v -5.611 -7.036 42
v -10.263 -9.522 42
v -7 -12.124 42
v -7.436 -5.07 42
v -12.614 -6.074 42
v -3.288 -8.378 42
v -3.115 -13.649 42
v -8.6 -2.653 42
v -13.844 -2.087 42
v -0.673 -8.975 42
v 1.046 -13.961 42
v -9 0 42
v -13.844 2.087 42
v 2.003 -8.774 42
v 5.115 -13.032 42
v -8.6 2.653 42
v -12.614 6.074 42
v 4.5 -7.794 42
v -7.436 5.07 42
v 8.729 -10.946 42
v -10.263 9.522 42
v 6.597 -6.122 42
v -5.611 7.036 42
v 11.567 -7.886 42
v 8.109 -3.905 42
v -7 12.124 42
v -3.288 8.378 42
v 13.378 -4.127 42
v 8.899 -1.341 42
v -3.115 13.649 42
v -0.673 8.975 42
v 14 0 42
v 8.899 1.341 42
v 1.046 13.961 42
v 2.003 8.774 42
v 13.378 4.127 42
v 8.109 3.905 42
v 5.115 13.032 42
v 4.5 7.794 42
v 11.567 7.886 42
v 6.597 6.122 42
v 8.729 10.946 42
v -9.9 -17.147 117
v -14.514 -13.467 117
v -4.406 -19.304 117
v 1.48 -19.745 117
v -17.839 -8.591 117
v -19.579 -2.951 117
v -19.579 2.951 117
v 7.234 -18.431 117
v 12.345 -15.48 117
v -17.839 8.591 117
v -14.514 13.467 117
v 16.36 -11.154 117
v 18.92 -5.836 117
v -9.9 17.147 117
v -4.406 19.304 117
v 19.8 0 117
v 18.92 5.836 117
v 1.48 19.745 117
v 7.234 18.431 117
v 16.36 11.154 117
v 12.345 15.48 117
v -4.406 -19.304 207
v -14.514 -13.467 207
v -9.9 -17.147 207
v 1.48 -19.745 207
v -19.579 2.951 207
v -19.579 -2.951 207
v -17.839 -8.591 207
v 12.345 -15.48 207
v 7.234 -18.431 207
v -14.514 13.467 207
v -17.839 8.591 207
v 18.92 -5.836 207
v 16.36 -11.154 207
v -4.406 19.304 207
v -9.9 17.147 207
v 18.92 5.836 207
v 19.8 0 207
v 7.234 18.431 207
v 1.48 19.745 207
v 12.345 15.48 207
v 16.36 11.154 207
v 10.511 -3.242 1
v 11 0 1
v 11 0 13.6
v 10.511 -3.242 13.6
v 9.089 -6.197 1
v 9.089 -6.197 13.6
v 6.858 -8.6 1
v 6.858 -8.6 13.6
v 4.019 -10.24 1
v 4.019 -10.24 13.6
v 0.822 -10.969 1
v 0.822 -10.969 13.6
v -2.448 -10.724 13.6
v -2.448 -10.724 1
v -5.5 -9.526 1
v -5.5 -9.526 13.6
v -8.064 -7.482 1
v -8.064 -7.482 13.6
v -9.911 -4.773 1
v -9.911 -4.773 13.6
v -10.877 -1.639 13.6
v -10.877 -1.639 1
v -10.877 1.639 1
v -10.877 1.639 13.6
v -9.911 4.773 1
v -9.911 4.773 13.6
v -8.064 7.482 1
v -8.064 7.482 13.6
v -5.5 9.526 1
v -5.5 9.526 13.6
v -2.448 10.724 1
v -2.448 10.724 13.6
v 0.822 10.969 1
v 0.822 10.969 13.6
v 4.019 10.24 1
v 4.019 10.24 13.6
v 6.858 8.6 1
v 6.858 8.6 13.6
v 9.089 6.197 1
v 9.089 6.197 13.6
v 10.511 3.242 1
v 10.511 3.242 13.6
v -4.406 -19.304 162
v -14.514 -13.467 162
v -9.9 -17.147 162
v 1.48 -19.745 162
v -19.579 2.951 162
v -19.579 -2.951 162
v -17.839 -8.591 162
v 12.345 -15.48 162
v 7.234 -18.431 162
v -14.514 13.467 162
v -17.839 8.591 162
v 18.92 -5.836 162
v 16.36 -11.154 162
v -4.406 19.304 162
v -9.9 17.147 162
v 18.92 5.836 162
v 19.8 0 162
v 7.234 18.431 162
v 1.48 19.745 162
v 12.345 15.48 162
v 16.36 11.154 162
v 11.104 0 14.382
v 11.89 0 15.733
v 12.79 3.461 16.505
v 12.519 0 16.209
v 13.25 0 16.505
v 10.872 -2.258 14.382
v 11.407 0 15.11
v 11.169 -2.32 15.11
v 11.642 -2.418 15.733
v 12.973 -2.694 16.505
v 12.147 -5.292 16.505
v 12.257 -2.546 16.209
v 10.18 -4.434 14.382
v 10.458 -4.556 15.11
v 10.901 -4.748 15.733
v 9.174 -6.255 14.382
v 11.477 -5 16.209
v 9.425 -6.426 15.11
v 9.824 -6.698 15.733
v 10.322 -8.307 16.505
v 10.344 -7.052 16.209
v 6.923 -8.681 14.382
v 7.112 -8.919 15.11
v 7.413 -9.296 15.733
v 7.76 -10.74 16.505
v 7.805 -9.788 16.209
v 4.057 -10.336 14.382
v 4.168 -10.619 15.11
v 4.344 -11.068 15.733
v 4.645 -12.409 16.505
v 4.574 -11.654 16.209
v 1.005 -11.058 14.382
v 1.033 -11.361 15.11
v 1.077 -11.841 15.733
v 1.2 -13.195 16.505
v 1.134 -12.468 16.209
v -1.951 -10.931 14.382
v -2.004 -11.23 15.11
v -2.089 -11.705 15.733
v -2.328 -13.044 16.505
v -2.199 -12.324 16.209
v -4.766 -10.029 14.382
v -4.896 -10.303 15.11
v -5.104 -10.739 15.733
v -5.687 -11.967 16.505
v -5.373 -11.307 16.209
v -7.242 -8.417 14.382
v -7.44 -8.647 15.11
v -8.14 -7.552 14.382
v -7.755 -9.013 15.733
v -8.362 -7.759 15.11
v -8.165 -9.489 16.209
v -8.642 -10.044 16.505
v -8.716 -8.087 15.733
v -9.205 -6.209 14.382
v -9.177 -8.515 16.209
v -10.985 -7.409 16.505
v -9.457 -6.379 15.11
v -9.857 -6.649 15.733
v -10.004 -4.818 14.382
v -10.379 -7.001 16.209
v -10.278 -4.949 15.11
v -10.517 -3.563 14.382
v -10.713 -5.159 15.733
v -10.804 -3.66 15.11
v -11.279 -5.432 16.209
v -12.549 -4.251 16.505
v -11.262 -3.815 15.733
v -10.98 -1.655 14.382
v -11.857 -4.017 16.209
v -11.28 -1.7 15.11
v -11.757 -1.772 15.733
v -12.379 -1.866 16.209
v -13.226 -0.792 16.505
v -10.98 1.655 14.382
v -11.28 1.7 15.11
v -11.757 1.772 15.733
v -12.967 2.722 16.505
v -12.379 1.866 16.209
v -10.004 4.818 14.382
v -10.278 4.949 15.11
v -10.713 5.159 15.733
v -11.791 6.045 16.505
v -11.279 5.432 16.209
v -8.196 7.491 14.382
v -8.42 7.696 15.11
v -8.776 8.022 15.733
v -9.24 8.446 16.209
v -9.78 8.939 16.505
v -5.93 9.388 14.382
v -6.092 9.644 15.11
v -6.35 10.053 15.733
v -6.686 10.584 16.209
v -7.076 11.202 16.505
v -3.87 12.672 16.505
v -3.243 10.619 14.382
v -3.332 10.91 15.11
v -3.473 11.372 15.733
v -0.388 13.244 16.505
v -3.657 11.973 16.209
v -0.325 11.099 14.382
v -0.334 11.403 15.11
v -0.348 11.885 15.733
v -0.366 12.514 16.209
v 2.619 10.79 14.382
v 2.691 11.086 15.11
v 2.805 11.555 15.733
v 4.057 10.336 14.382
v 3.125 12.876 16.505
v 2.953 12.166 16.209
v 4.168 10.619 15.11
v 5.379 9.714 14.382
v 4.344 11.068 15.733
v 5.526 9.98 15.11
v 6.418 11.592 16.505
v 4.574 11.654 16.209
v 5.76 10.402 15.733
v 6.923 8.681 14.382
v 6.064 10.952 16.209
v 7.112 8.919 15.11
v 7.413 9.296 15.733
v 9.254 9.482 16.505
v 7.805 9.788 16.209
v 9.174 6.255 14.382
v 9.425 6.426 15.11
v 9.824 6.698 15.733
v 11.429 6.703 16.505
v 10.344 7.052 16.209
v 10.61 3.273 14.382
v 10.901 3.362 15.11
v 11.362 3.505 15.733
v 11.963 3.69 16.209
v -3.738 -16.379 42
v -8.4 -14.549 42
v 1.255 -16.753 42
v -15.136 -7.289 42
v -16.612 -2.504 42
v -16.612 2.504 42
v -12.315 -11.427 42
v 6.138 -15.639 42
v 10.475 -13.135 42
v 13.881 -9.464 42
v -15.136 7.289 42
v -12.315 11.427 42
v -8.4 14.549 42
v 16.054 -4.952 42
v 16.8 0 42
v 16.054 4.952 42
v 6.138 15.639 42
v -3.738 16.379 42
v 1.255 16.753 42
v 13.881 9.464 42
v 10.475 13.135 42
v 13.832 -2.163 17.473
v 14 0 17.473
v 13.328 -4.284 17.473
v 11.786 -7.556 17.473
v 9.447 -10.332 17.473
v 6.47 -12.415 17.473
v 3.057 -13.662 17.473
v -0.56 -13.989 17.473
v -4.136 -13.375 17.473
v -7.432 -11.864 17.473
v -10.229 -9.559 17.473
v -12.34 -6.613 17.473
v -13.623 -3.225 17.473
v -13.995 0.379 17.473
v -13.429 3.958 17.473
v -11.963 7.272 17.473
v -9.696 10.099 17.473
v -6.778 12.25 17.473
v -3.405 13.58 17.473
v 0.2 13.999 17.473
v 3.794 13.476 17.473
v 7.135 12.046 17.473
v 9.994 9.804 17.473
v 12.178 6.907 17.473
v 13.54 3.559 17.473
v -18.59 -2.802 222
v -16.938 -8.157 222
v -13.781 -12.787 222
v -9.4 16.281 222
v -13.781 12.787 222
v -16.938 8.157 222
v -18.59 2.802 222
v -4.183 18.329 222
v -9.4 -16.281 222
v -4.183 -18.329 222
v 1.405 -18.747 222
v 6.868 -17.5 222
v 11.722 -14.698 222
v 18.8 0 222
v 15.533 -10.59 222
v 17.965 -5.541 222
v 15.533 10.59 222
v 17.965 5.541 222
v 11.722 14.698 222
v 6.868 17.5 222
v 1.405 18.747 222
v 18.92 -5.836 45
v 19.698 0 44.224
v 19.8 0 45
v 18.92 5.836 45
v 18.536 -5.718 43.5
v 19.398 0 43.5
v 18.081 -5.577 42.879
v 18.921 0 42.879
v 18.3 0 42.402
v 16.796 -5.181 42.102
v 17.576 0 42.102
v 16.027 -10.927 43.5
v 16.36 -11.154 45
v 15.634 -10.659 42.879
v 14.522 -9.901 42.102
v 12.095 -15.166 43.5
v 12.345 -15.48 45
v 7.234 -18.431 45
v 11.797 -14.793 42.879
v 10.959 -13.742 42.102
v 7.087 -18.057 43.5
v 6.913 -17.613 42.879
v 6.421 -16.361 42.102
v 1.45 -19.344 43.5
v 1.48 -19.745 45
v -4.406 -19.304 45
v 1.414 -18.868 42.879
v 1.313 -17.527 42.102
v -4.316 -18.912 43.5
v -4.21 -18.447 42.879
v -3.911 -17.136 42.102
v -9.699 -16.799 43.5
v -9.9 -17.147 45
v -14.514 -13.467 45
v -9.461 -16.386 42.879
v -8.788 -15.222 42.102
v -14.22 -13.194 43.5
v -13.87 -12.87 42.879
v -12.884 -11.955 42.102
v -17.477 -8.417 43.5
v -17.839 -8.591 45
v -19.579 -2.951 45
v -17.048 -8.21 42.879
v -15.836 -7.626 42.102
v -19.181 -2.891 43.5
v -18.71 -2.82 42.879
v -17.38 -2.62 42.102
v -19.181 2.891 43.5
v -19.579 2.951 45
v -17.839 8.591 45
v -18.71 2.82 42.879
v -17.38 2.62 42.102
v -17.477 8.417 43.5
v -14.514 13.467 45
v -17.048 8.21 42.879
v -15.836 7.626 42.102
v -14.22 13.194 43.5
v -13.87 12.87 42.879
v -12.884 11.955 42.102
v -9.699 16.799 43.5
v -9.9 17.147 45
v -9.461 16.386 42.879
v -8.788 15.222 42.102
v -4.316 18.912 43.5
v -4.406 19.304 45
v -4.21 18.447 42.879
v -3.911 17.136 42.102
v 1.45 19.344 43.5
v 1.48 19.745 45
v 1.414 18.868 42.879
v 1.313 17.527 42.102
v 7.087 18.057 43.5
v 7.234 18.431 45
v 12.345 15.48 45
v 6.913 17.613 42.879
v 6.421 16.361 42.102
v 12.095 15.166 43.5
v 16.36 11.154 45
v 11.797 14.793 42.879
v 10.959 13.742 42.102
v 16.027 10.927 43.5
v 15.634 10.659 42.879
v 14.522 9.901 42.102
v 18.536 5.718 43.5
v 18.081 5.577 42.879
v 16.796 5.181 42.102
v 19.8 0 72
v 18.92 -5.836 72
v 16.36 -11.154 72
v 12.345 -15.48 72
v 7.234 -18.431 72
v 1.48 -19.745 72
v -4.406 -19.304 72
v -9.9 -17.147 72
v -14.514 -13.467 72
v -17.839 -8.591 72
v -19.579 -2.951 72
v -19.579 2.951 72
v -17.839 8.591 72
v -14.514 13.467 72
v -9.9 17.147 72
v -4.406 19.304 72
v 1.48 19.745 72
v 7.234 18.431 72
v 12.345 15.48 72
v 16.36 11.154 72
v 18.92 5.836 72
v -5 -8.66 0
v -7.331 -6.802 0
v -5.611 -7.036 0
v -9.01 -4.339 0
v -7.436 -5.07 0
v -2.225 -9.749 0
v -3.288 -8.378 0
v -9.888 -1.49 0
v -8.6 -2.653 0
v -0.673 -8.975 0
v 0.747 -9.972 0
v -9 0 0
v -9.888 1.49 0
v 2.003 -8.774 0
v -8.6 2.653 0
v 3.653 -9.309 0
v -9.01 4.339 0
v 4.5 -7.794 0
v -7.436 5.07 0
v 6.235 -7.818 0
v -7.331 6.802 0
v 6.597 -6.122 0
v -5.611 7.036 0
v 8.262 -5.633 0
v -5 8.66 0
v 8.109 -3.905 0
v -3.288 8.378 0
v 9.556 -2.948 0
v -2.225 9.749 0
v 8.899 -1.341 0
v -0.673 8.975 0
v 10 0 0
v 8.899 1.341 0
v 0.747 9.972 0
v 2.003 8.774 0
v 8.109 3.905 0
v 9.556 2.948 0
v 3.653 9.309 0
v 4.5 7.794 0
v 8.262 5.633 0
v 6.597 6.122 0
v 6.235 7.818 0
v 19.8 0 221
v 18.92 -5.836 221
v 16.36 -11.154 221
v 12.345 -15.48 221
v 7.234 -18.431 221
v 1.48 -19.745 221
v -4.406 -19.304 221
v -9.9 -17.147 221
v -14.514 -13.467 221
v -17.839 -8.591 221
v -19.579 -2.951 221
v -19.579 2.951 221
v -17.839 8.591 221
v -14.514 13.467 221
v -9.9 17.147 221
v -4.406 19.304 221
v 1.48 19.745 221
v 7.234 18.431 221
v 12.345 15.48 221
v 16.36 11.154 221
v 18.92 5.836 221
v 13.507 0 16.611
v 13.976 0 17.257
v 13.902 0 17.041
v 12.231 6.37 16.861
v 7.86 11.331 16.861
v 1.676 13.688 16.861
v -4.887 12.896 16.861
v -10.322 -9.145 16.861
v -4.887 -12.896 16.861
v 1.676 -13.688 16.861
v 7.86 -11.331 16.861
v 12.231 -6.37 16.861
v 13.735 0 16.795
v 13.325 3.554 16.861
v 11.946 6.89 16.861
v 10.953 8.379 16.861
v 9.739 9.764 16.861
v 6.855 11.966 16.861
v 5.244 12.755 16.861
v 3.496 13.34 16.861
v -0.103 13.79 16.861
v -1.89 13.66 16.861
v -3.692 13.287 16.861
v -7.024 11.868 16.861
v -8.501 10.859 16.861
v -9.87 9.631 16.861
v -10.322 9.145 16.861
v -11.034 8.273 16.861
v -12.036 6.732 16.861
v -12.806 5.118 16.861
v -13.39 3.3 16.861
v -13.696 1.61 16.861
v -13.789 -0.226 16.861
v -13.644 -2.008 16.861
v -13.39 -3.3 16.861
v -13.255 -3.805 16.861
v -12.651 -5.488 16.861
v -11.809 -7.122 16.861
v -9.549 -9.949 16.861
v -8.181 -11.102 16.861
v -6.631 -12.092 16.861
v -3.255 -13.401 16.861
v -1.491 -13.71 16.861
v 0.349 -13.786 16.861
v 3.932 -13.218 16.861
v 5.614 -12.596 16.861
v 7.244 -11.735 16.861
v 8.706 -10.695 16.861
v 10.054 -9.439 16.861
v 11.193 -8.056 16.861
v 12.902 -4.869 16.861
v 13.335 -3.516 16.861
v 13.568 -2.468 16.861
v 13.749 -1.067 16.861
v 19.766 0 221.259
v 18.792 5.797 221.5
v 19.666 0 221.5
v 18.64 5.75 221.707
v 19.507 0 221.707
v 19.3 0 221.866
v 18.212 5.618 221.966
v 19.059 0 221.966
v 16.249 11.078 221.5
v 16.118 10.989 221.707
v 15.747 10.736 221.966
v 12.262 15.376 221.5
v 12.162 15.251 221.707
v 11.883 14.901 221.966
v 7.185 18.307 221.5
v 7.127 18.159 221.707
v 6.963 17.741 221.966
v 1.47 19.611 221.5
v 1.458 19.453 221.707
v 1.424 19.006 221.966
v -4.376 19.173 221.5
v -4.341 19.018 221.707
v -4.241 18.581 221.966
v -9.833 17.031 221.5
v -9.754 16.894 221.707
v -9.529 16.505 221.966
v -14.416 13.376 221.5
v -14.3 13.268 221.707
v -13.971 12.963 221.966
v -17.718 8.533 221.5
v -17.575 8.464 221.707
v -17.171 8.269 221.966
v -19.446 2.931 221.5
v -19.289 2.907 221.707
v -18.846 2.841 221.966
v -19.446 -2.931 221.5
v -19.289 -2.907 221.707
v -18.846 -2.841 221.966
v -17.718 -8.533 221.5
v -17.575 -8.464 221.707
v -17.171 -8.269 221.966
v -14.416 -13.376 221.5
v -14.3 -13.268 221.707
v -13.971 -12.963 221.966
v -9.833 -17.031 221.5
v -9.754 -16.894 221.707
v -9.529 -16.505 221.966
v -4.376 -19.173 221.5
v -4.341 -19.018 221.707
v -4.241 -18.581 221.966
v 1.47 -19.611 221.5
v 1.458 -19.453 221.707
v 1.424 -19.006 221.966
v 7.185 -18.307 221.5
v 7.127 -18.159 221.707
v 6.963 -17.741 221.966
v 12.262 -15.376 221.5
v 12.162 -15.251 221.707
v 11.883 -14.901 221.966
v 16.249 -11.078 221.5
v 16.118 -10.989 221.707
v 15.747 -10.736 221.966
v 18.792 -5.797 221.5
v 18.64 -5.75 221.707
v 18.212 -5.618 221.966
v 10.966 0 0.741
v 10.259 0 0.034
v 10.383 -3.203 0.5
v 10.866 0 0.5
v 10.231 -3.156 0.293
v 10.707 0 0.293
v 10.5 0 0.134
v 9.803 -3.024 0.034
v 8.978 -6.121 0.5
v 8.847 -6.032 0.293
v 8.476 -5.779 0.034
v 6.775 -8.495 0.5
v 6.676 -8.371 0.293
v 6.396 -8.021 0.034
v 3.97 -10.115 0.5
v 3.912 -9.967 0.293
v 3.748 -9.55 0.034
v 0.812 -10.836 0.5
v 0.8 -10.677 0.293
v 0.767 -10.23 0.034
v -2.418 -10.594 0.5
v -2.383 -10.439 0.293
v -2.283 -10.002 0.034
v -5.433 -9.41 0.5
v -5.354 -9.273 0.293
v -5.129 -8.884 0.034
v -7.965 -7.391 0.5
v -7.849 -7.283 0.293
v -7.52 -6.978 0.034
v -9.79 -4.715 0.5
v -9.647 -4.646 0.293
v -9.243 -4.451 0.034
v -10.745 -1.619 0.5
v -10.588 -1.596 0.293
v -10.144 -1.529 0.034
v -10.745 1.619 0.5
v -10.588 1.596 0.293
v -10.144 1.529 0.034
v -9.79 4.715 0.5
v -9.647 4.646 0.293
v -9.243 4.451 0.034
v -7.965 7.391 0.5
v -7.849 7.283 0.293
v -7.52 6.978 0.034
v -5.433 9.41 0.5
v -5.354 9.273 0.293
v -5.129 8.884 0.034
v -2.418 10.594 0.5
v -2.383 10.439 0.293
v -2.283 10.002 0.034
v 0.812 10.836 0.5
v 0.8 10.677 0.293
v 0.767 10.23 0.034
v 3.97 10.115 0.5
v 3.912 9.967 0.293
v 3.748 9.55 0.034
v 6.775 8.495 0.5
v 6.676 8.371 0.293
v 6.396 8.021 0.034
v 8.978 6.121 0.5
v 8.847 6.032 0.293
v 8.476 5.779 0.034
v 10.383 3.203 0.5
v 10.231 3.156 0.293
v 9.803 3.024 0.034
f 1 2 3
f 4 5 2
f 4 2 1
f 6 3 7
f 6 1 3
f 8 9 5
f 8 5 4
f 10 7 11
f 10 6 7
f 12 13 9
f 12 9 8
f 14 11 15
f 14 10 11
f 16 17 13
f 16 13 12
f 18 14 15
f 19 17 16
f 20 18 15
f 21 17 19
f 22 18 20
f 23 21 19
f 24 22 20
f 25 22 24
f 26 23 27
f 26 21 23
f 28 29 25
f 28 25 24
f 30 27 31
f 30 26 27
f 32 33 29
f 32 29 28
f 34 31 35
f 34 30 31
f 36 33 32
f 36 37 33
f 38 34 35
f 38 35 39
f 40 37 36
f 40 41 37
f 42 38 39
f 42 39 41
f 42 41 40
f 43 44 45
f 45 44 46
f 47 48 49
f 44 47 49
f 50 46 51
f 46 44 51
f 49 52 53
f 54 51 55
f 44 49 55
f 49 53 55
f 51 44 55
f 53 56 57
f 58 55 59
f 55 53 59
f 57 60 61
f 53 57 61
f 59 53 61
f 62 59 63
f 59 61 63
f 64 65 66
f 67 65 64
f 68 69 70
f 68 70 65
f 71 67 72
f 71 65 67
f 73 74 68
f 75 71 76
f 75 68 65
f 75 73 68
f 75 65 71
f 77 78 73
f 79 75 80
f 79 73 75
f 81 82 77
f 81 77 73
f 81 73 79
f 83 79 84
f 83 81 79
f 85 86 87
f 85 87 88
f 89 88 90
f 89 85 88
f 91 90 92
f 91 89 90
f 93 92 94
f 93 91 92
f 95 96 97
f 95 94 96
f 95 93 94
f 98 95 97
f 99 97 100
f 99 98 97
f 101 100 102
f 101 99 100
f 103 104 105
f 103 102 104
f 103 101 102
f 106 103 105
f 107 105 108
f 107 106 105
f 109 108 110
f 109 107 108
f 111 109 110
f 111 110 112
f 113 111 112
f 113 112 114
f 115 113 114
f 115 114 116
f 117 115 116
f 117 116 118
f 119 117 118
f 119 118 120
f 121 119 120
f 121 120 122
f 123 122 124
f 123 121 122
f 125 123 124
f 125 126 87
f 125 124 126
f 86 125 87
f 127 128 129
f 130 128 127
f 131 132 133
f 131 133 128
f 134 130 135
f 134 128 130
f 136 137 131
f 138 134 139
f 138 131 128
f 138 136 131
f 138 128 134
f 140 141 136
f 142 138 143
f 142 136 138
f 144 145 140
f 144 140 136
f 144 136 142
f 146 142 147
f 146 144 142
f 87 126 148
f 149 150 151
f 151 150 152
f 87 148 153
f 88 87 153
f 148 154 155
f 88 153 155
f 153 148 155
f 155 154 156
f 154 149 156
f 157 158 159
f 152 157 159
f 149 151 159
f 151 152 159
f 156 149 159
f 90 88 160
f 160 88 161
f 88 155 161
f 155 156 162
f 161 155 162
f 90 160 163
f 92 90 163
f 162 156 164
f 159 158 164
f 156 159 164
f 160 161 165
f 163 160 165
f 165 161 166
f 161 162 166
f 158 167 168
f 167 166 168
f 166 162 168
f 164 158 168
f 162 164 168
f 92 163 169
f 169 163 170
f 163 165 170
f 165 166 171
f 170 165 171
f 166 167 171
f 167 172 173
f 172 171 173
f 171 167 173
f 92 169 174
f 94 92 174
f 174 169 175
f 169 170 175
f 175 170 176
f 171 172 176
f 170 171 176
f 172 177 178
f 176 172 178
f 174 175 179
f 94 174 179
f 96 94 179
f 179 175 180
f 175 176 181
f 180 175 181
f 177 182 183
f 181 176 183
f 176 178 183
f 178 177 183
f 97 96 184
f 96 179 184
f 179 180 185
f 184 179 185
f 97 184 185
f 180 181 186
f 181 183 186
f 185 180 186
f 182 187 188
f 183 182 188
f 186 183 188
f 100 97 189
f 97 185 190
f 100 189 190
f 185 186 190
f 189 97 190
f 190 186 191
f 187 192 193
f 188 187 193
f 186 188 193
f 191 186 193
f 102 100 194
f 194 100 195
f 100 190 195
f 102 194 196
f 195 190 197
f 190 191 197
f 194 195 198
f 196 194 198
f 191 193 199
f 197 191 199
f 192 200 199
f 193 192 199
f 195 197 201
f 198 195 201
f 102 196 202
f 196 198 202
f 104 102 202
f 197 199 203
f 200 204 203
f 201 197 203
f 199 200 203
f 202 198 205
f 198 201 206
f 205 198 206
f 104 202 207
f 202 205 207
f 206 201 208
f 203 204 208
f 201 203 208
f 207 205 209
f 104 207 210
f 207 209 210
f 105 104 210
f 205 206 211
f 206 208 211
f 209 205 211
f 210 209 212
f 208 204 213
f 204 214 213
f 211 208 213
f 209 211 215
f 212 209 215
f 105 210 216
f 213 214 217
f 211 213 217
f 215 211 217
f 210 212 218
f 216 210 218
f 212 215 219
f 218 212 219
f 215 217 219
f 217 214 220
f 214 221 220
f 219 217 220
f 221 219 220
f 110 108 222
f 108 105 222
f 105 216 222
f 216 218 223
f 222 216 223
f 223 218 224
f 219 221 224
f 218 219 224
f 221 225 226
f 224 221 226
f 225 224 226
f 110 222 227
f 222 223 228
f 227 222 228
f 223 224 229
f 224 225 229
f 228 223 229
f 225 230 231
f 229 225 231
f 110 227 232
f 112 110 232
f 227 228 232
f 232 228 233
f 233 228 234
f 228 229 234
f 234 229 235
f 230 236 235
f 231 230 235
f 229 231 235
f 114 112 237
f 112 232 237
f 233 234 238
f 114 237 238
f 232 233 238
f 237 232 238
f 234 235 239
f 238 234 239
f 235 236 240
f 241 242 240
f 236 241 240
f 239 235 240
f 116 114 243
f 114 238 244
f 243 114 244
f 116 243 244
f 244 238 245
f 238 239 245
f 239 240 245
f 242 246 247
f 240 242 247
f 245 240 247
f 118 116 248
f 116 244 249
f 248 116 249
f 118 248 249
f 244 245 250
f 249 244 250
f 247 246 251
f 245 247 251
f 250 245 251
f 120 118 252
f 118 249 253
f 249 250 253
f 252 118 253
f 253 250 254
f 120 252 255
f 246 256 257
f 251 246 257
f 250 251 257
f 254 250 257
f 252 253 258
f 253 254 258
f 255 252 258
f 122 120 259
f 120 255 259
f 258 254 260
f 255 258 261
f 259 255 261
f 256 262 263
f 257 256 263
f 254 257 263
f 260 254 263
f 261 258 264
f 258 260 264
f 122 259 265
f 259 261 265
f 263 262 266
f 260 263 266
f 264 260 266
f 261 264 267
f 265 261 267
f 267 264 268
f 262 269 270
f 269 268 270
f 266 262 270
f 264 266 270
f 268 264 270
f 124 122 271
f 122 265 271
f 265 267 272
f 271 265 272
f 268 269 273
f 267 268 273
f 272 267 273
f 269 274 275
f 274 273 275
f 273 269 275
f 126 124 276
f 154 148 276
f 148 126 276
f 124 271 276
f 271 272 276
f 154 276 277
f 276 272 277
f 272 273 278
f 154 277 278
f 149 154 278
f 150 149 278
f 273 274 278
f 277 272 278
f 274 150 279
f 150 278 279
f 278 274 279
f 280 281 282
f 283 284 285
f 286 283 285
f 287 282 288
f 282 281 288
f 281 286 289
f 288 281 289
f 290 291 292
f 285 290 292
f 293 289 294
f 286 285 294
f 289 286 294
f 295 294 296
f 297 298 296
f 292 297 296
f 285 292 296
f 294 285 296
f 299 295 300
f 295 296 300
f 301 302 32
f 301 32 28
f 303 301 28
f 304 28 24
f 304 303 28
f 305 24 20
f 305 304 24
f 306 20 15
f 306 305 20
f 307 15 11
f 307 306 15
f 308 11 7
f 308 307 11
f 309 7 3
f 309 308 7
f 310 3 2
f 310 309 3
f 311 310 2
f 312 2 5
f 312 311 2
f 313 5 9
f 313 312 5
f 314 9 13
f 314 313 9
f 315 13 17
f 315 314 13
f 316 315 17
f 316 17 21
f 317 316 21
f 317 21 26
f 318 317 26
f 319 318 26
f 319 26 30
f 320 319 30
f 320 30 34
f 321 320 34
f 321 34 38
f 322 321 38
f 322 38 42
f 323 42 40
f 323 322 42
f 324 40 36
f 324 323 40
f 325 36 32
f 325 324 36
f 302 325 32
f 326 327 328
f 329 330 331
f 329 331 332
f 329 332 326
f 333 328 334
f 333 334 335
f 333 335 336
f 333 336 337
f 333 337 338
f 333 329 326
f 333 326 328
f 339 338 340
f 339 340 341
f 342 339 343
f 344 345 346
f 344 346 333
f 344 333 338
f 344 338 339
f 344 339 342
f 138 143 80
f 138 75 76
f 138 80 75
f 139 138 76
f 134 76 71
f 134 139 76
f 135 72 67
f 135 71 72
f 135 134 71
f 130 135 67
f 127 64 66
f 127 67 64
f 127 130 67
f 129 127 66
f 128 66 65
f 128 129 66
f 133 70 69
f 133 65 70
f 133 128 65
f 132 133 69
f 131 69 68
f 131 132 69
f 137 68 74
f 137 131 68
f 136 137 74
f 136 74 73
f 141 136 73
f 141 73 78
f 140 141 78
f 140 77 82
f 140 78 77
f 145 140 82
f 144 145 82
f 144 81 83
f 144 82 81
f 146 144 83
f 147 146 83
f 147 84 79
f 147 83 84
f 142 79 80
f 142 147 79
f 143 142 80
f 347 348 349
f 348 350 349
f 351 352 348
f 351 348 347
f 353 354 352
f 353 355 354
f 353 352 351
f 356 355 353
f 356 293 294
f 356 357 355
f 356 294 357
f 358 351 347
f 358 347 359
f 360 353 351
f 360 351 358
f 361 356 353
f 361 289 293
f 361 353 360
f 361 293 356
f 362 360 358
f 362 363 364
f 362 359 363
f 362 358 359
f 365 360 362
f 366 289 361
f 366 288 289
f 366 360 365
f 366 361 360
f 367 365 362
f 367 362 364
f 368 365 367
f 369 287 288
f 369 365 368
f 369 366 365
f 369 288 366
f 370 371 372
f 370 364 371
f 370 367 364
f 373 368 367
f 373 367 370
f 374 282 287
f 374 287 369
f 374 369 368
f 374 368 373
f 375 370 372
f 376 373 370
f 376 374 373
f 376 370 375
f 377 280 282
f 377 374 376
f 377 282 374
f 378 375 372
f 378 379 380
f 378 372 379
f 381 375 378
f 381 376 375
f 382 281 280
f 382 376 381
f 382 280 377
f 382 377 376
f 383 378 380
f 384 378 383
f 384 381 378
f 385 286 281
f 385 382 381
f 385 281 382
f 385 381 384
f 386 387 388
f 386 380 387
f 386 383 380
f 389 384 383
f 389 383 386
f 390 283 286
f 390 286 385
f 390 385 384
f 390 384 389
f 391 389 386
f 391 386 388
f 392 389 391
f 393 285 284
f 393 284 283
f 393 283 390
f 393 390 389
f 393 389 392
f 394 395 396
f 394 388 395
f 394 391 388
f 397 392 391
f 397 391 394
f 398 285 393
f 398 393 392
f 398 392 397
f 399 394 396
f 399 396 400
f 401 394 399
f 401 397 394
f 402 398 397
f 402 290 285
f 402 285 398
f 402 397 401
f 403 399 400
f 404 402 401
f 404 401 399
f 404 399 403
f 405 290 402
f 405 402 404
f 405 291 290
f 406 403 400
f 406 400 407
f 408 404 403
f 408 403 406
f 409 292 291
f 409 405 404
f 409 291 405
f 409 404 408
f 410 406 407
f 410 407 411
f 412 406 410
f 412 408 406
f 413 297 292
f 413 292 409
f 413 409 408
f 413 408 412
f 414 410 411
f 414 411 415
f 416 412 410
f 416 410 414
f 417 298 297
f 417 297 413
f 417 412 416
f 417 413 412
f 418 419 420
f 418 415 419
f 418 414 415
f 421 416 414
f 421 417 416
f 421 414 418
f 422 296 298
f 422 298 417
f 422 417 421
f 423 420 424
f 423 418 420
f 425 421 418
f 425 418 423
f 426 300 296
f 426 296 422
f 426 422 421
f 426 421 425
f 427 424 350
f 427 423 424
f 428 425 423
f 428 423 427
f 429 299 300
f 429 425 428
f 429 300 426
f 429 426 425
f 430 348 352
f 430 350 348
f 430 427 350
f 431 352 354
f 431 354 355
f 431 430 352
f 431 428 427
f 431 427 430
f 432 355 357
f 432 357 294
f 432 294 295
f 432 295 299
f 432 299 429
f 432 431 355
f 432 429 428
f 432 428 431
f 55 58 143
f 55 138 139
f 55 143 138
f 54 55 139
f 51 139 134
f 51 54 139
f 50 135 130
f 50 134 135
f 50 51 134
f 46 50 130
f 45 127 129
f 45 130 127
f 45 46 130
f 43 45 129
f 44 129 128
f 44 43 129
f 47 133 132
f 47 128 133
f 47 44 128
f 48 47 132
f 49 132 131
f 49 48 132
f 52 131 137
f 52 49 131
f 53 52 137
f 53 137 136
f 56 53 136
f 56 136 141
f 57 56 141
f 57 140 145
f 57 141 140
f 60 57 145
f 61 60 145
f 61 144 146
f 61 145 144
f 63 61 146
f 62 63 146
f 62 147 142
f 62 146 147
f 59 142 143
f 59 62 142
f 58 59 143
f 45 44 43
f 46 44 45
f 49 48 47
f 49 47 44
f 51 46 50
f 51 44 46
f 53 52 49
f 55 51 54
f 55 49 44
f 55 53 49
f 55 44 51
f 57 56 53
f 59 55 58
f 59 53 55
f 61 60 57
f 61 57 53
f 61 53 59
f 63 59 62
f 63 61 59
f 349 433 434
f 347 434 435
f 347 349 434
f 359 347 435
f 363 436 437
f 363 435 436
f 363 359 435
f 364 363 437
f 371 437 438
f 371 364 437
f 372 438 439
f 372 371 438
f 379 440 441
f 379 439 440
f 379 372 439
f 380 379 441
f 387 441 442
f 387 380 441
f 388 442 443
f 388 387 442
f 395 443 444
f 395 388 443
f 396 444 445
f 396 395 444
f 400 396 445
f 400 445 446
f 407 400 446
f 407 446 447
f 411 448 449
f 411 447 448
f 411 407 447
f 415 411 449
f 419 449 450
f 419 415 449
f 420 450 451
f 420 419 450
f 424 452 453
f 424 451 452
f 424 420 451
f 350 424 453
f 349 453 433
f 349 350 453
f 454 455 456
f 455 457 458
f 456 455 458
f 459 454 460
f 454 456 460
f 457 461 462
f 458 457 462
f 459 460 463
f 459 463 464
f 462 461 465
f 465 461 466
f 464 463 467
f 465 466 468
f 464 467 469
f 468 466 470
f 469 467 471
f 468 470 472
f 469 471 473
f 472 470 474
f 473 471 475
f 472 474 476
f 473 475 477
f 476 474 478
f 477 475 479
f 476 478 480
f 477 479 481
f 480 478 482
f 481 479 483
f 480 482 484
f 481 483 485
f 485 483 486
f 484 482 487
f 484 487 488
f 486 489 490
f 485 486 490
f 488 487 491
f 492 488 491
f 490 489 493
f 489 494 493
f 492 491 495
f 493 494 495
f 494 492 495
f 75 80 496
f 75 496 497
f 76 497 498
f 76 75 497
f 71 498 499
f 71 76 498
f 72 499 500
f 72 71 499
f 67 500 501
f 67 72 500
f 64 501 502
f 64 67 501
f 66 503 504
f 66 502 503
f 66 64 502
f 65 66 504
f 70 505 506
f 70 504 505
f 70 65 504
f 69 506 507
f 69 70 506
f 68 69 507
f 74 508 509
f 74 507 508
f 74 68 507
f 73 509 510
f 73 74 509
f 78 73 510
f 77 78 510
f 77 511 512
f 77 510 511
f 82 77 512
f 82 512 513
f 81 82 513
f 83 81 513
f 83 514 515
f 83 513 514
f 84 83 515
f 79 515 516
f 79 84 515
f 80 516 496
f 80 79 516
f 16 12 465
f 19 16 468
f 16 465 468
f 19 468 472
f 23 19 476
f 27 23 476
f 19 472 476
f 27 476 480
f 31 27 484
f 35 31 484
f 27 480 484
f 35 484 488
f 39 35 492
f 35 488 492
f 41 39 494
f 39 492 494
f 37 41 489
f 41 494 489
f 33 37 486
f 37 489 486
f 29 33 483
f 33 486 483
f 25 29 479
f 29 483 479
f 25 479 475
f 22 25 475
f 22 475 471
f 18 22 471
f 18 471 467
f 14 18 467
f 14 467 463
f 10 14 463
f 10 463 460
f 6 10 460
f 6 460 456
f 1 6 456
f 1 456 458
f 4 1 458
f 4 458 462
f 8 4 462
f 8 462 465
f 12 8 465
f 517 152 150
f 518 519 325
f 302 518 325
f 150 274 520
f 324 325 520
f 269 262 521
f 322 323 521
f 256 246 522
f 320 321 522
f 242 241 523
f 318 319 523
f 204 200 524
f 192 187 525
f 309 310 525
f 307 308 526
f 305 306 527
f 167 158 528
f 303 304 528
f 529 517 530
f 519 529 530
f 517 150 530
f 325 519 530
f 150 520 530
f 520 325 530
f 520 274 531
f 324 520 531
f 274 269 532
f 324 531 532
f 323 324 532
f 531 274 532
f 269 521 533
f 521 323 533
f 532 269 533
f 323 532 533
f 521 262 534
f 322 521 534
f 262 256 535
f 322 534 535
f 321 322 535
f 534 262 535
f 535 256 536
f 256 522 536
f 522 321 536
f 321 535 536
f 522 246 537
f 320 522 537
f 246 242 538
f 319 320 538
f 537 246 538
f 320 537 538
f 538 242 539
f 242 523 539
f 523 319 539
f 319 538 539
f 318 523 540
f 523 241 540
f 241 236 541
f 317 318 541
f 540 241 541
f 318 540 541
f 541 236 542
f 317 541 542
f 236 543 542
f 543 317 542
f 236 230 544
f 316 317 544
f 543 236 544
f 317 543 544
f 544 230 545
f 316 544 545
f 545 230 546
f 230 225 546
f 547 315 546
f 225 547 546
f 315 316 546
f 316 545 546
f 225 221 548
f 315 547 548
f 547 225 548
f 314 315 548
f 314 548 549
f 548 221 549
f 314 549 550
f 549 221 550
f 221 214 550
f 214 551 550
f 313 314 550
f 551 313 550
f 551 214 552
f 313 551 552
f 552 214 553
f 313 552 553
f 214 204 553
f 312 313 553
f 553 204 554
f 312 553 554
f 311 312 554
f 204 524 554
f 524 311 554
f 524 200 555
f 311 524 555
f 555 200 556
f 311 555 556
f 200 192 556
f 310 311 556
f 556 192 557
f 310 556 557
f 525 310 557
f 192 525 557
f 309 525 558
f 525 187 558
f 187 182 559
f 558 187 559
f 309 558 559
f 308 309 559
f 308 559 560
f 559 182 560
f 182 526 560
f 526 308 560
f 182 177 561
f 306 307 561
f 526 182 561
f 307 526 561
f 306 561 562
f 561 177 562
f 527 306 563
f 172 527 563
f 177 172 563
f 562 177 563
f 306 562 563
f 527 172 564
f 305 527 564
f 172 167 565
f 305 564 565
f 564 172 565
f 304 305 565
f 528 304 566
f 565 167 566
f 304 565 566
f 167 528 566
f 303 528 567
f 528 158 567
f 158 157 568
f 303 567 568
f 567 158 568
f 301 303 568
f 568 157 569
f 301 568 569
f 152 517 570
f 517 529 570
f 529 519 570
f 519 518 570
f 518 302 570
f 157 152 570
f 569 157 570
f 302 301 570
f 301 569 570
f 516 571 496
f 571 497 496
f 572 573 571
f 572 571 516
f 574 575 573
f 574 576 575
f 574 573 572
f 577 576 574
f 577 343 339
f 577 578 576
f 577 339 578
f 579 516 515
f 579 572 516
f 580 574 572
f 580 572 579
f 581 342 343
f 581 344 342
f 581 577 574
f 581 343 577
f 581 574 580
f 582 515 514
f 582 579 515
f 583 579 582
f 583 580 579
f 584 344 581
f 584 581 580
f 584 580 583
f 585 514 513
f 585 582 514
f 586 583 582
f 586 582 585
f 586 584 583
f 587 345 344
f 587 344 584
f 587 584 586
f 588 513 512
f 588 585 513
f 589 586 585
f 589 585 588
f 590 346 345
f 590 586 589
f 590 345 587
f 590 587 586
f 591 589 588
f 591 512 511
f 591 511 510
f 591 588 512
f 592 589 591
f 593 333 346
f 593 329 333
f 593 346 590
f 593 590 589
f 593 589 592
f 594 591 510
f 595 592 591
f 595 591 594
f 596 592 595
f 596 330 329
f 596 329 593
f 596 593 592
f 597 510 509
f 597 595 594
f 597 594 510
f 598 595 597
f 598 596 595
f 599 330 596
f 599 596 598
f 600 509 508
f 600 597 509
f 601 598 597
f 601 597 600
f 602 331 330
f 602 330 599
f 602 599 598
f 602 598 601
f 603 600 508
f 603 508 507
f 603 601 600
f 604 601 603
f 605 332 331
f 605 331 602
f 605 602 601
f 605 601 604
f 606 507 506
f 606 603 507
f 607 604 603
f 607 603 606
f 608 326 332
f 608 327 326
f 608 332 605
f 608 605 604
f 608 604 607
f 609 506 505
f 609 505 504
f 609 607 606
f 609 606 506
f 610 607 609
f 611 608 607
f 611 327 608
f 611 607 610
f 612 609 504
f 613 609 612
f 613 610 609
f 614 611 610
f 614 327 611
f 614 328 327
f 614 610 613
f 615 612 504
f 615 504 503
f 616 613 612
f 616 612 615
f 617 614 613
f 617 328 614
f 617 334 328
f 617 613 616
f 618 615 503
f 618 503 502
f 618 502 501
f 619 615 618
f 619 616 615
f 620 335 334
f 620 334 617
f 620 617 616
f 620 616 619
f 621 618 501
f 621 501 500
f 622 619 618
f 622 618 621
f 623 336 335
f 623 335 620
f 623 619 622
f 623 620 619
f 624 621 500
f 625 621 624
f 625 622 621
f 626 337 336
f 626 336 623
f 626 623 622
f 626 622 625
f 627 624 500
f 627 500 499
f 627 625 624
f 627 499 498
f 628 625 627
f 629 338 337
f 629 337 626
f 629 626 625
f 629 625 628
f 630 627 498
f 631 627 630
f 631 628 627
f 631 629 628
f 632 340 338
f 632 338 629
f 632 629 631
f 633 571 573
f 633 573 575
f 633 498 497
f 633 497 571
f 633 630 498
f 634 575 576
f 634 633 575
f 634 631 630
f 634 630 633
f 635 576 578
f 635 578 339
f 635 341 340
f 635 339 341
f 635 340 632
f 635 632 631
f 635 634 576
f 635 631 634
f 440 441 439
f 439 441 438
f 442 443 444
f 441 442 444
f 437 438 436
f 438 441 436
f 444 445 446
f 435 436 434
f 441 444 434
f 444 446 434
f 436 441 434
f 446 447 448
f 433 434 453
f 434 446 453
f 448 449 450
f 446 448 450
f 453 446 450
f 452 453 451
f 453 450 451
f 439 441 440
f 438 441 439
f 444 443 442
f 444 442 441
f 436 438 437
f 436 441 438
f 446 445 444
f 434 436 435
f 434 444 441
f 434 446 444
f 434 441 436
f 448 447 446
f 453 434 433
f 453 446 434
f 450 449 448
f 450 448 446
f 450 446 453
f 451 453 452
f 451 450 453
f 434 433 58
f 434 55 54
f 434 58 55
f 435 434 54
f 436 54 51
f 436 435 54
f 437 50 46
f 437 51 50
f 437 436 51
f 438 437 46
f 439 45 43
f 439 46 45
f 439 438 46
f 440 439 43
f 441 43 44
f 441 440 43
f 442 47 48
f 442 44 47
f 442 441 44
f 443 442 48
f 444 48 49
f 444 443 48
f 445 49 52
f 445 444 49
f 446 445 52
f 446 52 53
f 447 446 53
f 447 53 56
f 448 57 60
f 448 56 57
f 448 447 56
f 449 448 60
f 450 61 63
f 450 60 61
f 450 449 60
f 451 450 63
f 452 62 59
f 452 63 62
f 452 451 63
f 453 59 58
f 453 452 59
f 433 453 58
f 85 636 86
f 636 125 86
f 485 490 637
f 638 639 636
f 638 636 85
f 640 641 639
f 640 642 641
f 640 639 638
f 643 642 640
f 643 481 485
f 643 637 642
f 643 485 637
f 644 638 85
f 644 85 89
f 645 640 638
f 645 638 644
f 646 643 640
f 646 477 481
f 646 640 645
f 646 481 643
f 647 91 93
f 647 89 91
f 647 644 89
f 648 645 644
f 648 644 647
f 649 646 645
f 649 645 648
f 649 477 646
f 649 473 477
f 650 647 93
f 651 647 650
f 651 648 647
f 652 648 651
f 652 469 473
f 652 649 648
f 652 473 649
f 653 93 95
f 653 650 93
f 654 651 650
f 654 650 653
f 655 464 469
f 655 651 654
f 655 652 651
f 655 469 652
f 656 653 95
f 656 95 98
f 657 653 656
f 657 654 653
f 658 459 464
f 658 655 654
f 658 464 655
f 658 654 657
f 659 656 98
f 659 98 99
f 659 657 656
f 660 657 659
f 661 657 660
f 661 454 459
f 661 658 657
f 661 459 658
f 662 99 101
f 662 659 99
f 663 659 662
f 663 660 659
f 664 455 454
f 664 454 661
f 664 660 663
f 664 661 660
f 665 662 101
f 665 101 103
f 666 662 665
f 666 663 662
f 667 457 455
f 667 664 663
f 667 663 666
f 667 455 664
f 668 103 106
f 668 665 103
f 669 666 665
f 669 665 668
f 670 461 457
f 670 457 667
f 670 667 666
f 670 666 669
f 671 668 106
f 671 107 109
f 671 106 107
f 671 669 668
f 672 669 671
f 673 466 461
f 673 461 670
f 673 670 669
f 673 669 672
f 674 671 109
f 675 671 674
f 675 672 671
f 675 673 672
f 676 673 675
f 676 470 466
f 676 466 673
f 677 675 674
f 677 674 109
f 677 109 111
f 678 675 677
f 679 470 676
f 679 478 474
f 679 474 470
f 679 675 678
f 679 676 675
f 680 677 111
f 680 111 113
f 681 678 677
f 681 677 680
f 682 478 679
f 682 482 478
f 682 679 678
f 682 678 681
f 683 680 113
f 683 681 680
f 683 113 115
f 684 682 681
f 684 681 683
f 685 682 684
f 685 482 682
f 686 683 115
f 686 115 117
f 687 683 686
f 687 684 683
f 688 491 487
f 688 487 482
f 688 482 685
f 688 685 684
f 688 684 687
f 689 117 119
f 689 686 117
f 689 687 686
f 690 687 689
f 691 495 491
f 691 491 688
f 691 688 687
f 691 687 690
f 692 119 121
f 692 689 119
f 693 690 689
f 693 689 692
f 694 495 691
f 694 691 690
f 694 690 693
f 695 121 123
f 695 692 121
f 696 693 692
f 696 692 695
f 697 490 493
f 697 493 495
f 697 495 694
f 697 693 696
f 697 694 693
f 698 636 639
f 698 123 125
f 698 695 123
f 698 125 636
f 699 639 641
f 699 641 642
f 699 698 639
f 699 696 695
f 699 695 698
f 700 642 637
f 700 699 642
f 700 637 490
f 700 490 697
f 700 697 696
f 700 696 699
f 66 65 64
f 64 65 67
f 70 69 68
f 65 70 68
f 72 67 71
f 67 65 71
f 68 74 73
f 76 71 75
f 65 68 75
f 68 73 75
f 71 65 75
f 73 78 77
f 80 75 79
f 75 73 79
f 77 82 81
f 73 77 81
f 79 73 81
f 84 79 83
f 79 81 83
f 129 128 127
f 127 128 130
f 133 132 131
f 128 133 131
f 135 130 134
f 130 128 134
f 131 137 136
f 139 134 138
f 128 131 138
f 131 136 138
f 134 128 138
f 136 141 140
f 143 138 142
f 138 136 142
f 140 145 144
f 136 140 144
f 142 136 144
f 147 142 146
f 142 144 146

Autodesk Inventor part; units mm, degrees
ref_plane "YZ Plane" through (0, 0, 0) normal (1, 0, 0) x (0, 1, 0)
ref_plane "XZ Plane" through (0, 0, 0) normal (0, 1, 0) x (-1, 0, 0)
ref_plane "XY Plane" through (0, 0, 0) normal (0, 0, 1) x (1, 0, 0)
sketch "Sketch1" plane through (0, 0, 0) normal (0, 0, 1) x (1, 0, 0)
  circle A0 centre (0, 0) radius 11
  dimension "d0" = 22
extrude "Extrusion1" add sketch "Sketch1" along normal blind 16.6
sketch "Sketch2" plane through (0, 0, 16.6) normal (0, 0, 1) x (1, 0, 0)
  circle A0 centre (0, 0) radius 14
  dimension "d3" = 28
extrude "Extrusion2" add sketch "Sketch2" along normal blind 25.4
sketch "Sketch3" plane through (0, 0, 0) normal (0, 0, -1) x (-1, 0, 0)
  circle A0 centre (0, 0) radius 9
  dimension "d6" = 18
extrude "Extrusion3" cut sketch "Sketch3" against normal through all
fillet "Fillet1" radius 1 1 edges at (-11, 0, 0)
fillet "Fillet2" radius 3 1 edges at (-11, 0, 16.6)
sketch "Sketch4" plane through (0, 0, 42) normal (0, 0, 1) x (1, 0, 0)
  circle A0 centre (0, 0) radius 19.8
  dimension "d11" = 39.6
extrude "Extrusion4" add sketch "Sketch4" along normal blind 30 separate body
sketch "Sketch5" plane through (0, 0, 72) normal (0, 0, 1) x (1, 0, 0)
  circle A0 centre (0, 0) radius 19.8
extrude "Extrusion5" add sketch "Sketch5" along normal blind 45 separate body
sketch "Sketch6" plane through (0, 0, 117) normal (0, 0, 1) x (1, 0, 0)
  circle A0 centre (0, 0) radius 19.8
extrude "Extrusion6" add sketch "Sketch6" along normal blind 45 separate body
sketch "Sketch7" plane through (0, 0, 162) normal (0, 0, 1) x (1, 0, 0)
  circle A0 centre (0, 0) radius 19.8
extrude "Extrusion7" add sketch "Sketch7" along normal blind 45 separate body
sketch "Sketch8" plane through (0, 0, 207) normal (0, 0, 1) x (1, 0, 0)
  circle A0 centre (0, 0) radius 19.8
extrude "Extrusion8" add sketch "Sketch8" along normal blind 15 separate body
fillet "Fillet3" radius 1 2 edges at (-13.9995, 0, 16.6) (-14, 0, 16.6)
fillet "Fillet4" radius 3 1 edges at (-19.8, 0, 42)
fillet "Fillet5" radius 1 1 edges at (-19.8, 0, 222)
properties part number "Light Stack"
